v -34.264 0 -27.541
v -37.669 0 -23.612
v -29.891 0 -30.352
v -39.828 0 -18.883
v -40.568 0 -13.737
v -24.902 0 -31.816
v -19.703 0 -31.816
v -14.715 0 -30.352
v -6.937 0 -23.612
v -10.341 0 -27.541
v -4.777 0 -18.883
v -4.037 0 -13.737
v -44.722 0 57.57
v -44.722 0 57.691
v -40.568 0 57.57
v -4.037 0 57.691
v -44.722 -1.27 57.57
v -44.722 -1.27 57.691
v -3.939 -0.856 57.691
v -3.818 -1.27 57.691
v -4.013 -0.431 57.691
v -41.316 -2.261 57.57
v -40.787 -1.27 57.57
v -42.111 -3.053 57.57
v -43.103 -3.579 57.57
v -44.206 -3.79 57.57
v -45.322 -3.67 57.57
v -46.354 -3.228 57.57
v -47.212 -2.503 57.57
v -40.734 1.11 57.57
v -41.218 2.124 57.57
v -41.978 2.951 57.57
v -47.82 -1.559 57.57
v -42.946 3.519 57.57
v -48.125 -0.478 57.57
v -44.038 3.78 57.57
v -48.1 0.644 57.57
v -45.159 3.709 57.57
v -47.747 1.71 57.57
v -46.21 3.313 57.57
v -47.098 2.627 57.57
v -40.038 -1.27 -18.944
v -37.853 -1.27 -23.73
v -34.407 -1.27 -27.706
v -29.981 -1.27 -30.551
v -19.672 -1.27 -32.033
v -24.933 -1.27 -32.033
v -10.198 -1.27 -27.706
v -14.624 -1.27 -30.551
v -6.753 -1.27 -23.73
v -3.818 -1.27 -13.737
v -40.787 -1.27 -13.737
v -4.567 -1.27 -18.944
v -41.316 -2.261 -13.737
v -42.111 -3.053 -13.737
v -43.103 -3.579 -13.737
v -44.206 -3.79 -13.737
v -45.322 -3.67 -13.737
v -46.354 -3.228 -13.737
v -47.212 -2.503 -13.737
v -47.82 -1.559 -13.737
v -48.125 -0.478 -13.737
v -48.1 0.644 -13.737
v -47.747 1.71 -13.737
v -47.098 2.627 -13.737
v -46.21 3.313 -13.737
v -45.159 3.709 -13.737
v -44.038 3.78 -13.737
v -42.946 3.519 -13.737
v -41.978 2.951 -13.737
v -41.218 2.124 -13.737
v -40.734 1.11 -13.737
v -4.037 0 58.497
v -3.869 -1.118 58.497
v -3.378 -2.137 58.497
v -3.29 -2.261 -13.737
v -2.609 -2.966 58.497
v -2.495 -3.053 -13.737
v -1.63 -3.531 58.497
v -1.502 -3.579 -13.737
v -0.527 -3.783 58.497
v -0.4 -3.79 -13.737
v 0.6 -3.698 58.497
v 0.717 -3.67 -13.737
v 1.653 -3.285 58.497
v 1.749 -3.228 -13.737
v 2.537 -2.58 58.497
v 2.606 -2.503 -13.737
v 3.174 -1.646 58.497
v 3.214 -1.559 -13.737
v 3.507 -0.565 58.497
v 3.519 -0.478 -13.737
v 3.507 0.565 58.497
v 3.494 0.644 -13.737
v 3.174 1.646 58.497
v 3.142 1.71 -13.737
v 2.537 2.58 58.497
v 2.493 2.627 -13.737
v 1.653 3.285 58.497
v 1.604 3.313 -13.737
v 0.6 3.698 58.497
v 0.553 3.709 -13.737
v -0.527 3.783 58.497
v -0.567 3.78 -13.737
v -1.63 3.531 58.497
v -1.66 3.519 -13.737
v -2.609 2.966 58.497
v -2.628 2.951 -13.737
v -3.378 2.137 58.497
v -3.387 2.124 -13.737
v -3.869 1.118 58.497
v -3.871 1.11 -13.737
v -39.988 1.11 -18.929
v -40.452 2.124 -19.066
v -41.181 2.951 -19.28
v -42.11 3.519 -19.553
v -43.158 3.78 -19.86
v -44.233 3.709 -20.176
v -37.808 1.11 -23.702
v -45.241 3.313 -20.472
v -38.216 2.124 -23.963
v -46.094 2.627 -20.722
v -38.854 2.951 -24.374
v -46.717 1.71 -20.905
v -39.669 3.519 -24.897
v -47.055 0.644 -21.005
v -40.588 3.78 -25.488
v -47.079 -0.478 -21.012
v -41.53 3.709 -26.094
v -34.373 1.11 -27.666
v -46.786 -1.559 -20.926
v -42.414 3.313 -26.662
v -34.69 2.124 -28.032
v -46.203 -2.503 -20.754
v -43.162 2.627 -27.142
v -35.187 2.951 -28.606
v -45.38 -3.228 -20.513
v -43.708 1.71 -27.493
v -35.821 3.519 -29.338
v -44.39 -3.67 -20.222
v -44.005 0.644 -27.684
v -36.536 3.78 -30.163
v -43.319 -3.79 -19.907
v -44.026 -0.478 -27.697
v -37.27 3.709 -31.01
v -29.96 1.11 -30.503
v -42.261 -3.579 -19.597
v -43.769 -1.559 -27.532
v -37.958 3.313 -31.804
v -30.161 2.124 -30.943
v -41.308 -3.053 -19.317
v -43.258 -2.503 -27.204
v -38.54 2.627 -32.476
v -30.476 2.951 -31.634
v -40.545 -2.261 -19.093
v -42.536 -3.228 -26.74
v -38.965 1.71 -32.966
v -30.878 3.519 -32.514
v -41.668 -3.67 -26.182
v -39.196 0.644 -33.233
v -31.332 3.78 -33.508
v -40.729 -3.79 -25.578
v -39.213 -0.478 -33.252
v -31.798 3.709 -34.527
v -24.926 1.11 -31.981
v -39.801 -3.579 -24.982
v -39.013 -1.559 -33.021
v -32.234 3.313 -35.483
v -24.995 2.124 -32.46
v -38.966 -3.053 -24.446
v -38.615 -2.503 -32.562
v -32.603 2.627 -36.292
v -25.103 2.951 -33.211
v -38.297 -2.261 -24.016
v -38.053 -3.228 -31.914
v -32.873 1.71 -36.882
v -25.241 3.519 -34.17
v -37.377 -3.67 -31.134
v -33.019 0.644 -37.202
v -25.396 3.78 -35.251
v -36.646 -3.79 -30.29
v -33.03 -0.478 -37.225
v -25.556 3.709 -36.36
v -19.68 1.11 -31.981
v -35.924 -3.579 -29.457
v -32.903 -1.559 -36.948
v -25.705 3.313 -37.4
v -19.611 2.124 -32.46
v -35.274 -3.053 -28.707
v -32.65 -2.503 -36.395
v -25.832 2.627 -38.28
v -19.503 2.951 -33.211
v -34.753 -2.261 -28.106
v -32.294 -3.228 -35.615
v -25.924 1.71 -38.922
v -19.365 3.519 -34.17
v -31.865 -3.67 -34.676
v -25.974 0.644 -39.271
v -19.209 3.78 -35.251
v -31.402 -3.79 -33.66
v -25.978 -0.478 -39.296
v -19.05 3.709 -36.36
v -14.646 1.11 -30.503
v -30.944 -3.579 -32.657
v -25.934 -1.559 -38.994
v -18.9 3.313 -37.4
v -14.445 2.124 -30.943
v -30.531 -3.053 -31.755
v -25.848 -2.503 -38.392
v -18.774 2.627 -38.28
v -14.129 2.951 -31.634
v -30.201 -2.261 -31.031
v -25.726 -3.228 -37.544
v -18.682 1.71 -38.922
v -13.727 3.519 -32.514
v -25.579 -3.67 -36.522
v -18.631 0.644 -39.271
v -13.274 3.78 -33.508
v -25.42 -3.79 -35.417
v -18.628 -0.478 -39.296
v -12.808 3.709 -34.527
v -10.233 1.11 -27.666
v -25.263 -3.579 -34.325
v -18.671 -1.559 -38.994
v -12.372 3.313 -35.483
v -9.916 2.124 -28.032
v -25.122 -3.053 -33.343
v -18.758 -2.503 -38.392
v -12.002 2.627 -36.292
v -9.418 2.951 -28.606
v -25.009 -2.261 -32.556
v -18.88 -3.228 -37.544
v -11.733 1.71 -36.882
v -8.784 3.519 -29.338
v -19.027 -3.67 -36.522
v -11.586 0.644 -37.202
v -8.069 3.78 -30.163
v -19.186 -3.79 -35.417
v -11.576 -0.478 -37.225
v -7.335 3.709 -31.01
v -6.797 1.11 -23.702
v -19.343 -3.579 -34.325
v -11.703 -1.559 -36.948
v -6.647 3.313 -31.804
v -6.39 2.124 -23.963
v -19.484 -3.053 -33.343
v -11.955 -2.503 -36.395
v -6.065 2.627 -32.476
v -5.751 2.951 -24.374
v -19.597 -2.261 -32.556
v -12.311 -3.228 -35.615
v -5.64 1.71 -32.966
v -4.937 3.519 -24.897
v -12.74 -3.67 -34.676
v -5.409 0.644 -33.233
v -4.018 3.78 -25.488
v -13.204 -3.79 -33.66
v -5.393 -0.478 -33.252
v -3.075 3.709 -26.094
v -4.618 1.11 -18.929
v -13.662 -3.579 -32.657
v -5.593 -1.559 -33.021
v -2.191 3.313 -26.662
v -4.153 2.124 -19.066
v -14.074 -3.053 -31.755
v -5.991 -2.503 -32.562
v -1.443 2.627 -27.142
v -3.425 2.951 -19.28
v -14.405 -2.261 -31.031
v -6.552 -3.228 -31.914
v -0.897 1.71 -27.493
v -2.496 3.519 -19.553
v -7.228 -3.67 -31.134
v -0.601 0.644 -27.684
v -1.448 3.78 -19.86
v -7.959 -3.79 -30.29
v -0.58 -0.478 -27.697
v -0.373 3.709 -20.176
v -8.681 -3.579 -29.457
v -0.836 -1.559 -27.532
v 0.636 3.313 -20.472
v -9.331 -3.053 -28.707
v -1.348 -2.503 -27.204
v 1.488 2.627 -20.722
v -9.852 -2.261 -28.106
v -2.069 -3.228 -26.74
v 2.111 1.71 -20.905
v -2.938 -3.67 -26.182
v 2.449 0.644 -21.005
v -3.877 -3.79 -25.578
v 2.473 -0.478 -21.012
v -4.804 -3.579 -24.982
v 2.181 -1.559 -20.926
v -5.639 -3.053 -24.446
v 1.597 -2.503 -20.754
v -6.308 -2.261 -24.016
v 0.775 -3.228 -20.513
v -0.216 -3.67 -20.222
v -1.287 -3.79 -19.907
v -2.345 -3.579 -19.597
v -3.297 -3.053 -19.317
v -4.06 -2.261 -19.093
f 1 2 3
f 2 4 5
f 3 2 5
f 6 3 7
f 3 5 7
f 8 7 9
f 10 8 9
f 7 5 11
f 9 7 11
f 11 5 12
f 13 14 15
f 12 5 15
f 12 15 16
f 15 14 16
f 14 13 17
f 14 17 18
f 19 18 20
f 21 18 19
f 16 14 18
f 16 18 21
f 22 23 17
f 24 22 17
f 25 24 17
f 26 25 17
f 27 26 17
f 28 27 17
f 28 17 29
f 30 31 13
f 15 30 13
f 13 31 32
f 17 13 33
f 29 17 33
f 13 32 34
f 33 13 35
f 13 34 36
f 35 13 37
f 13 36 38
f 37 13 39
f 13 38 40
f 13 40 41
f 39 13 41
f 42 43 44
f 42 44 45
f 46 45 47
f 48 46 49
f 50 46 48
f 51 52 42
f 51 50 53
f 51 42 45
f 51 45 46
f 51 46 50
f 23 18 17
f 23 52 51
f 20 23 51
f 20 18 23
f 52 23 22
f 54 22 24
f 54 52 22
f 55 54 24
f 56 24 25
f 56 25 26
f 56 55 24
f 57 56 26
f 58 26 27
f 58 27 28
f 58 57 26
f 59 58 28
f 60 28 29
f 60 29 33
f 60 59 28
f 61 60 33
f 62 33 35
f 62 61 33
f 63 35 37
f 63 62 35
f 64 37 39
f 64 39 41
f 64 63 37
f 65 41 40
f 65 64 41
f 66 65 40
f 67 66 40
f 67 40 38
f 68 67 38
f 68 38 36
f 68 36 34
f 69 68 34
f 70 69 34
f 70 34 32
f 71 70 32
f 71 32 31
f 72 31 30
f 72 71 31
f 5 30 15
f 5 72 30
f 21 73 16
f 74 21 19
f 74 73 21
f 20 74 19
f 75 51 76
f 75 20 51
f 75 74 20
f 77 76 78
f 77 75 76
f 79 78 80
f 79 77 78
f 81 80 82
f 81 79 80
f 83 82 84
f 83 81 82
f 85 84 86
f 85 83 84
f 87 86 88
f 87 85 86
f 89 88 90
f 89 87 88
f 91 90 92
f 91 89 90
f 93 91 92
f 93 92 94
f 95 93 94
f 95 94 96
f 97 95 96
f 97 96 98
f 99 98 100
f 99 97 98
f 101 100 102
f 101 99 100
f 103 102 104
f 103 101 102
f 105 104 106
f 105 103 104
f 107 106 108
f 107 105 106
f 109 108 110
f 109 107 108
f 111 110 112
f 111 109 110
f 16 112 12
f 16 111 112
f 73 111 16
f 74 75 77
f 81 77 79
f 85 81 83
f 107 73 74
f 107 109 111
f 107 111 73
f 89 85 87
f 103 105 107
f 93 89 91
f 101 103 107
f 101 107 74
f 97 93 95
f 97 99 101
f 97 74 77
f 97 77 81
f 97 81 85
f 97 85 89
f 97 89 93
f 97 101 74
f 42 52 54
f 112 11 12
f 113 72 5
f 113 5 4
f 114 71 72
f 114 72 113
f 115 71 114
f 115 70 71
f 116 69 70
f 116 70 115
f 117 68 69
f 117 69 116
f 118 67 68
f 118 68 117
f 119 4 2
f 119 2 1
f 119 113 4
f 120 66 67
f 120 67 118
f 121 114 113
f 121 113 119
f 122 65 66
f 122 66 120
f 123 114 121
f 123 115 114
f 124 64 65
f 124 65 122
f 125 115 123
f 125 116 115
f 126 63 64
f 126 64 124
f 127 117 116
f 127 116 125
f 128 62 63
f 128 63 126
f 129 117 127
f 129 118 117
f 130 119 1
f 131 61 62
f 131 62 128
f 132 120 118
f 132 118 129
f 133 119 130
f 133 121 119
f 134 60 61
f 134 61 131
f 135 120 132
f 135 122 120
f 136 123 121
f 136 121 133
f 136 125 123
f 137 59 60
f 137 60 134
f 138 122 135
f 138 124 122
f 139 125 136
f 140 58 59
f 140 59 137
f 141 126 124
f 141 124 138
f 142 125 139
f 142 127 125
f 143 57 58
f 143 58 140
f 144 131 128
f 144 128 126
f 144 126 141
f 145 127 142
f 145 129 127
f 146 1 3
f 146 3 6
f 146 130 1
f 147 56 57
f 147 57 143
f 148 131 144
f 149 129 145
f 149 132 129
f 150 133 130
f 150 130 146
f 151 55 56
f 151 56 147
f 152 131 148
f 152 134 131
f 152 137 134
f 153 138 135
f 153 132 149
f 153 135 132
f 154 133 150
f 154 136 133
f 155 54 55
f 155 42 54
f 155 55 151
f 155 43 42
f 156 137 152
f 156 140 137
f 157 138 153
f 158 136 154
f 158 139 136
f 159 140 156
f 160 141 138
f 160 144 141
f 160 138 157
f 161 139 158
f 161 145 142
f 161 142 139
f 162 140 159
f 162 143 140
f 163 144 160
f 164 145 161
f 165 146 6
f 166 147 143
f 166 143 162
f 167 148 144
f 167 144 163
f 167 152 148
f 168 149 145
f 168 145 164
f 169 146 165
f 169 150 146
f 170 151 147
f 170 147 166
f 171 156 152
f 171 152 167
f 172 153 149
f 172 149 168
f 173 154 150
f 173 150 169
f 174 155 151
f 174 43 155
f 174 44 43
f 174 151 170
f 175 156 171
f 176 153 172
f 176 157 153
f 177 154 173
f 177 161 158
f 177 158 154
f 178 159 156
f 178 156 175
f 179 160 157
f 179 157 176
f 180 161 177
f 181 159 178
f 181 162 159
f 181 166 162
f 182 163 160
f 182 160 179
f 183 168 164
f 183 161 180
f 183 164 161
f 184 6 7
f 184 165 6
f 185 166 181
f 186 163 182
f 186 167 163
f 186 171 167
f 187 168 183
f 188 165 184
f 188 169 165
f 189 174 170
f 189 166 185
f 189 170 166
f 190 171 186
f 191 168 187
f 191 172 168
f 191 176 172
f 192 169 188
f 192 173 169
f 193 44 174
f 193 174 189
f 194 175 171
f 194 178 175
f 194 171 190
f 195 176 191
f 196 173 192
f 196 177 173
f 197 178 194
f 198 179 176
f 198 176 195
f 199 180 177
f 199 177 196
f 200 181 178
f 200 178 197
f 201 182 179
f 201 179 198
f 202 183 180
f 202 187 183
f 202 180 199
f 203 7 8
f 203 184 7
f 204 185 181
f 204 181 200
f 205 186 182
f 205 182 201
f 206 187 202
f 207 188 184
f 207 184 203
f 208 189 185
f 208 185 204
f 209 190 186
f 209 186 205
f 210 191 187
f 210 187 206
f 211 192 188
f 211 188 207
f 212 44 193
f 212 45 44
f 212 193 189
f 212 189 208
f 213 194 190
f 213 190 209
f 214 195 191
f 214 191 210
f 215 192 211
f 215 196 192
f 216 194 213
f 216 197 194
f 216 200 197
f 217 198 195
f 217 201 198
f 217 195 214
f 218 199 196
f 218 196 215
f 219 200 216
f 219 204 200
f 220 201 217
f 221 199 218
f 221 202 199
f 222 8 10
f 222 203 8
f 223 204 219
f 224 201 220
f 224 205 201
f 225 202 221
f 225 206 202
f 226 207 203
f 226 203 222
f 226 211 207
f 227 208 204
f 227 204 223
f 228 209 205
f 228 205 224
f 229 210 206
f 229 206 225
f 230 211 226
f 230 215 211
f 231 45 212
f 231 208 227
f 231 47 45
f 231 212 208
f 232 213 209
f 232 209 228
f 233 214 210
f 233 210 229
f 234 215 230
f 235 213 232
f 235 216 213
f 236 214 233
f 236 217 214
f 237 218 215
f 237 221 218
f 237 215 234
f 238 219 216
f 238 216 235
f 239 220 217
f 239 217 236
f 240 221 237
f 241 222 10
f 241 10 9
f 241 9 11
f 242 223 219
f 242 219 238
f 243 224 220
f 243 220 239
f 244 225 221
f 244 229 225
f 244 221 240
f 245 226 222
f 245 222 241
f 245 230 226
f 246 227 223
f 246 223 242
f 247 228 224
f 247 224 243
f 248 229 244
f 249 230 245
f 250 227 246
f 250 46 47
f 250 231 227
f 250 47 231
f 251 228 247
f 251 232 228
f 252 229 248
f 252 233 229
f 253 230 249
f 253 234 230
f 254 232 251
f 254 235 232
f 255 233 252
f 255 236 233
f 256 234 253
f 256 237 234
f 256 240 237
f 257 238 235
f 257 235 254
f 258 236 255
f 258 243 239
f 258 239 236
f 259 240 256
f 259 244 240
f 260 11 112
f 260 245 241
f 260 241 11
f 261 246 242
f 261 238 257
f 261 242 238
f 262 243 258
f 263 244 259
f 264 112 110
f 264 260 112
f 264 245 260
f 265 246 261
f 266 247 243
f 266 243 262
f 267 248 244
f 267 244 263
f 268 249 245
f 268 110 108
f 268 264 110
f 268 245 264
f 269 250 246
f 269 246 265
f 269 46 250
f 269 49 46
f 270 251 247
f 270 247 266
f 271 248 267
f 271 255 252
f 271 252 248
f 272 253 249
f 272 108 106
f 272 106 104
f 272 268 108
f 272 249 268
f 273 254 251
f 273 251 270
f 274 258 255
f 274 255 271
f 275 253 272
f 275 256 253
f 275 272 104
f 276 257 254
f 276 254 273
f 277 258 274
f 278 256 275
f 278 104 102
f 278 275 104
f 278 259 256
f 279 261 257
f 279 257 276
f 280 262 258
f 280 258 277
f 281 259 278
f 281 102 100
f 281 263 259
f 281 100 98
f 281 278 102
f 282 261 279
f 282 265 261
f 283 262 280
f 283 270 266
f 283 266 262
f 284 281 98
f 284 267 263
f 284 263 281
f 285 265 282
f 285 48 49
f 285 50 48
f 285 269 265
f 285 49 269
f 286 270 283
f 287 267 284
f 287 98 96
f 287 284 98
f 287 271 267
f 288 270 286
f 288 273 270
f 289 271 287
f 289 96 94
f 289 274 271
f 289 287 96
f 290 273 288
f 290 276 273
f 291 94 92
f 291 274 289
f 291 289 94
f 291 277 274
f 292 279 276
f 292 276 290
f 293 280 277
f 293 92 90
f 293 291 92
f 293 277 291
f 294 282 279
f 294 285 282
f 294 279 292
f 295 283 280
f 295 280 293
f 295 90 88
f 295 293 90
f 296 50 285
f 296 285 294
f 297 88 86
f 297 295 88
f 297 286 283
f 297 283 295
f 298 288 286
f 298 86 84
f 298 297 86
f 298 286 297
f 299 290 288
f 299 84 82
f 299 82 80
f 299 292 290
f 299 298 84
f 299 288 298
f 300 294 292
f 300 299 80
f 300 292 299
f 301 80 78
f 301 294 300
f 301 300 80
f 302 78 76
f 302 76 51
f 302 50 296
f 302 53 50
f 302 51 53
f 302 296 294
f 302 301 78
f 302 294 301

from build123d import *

# Parameters (mm, degrees)
F2_R     = 3.7933293271
F4_W     = 44.7215028107
F4_H     = 71.540701203
F5_DEPTH = 1.27


# Not quite as in the source:
# - a feature of the source that left no trace in its solid (it failed there, or was rolled back) is left out


with BuildPart() as f3:
    # F3: sweep along a path in F0
    with BuildLine(Plane.XZ) as f3_path:
        Line((-44.6055270731, 57.5704574585), (-44.6055270731, -13.7366456911))
        ThreePointArc((-44.6055270731, -13.7366456911), (-22.3027635366, -36.0394092277), (0, -13.7366456911))
        Line((0, -13.7366456911), (0, 58.4965236485))
    # F2 (on line) → F3 (sweep)
    with BuildSketch(Plane(origin=(0, 0, 57.5704574585), x_dir=(1, 0, 0), z_dir=(0, 0, -1))):
        with Locations((-44.3615987897, 0)):
            Circle(F2_R)
    sweep(path=f3_path.line)

    # F4 (on Front) → F5 (join)
    with BuildSketch(Plane.XZ):
        with Locations((-22.3607514054, 21.9205492176)):
            Rectangle(F4_W, F4_H)
        with BuildLine():
            Line((0, -13.8498013839), (-44.7215028107, -13.8498013839))
            ThreePointArc((-44.7215028107, -13.8498013839), (-22.3607514054, -36.2105527893), (0, -13.8498013839))
        make_face()
    extrude(amount=F5_DEPTH)


solid = f3.part
